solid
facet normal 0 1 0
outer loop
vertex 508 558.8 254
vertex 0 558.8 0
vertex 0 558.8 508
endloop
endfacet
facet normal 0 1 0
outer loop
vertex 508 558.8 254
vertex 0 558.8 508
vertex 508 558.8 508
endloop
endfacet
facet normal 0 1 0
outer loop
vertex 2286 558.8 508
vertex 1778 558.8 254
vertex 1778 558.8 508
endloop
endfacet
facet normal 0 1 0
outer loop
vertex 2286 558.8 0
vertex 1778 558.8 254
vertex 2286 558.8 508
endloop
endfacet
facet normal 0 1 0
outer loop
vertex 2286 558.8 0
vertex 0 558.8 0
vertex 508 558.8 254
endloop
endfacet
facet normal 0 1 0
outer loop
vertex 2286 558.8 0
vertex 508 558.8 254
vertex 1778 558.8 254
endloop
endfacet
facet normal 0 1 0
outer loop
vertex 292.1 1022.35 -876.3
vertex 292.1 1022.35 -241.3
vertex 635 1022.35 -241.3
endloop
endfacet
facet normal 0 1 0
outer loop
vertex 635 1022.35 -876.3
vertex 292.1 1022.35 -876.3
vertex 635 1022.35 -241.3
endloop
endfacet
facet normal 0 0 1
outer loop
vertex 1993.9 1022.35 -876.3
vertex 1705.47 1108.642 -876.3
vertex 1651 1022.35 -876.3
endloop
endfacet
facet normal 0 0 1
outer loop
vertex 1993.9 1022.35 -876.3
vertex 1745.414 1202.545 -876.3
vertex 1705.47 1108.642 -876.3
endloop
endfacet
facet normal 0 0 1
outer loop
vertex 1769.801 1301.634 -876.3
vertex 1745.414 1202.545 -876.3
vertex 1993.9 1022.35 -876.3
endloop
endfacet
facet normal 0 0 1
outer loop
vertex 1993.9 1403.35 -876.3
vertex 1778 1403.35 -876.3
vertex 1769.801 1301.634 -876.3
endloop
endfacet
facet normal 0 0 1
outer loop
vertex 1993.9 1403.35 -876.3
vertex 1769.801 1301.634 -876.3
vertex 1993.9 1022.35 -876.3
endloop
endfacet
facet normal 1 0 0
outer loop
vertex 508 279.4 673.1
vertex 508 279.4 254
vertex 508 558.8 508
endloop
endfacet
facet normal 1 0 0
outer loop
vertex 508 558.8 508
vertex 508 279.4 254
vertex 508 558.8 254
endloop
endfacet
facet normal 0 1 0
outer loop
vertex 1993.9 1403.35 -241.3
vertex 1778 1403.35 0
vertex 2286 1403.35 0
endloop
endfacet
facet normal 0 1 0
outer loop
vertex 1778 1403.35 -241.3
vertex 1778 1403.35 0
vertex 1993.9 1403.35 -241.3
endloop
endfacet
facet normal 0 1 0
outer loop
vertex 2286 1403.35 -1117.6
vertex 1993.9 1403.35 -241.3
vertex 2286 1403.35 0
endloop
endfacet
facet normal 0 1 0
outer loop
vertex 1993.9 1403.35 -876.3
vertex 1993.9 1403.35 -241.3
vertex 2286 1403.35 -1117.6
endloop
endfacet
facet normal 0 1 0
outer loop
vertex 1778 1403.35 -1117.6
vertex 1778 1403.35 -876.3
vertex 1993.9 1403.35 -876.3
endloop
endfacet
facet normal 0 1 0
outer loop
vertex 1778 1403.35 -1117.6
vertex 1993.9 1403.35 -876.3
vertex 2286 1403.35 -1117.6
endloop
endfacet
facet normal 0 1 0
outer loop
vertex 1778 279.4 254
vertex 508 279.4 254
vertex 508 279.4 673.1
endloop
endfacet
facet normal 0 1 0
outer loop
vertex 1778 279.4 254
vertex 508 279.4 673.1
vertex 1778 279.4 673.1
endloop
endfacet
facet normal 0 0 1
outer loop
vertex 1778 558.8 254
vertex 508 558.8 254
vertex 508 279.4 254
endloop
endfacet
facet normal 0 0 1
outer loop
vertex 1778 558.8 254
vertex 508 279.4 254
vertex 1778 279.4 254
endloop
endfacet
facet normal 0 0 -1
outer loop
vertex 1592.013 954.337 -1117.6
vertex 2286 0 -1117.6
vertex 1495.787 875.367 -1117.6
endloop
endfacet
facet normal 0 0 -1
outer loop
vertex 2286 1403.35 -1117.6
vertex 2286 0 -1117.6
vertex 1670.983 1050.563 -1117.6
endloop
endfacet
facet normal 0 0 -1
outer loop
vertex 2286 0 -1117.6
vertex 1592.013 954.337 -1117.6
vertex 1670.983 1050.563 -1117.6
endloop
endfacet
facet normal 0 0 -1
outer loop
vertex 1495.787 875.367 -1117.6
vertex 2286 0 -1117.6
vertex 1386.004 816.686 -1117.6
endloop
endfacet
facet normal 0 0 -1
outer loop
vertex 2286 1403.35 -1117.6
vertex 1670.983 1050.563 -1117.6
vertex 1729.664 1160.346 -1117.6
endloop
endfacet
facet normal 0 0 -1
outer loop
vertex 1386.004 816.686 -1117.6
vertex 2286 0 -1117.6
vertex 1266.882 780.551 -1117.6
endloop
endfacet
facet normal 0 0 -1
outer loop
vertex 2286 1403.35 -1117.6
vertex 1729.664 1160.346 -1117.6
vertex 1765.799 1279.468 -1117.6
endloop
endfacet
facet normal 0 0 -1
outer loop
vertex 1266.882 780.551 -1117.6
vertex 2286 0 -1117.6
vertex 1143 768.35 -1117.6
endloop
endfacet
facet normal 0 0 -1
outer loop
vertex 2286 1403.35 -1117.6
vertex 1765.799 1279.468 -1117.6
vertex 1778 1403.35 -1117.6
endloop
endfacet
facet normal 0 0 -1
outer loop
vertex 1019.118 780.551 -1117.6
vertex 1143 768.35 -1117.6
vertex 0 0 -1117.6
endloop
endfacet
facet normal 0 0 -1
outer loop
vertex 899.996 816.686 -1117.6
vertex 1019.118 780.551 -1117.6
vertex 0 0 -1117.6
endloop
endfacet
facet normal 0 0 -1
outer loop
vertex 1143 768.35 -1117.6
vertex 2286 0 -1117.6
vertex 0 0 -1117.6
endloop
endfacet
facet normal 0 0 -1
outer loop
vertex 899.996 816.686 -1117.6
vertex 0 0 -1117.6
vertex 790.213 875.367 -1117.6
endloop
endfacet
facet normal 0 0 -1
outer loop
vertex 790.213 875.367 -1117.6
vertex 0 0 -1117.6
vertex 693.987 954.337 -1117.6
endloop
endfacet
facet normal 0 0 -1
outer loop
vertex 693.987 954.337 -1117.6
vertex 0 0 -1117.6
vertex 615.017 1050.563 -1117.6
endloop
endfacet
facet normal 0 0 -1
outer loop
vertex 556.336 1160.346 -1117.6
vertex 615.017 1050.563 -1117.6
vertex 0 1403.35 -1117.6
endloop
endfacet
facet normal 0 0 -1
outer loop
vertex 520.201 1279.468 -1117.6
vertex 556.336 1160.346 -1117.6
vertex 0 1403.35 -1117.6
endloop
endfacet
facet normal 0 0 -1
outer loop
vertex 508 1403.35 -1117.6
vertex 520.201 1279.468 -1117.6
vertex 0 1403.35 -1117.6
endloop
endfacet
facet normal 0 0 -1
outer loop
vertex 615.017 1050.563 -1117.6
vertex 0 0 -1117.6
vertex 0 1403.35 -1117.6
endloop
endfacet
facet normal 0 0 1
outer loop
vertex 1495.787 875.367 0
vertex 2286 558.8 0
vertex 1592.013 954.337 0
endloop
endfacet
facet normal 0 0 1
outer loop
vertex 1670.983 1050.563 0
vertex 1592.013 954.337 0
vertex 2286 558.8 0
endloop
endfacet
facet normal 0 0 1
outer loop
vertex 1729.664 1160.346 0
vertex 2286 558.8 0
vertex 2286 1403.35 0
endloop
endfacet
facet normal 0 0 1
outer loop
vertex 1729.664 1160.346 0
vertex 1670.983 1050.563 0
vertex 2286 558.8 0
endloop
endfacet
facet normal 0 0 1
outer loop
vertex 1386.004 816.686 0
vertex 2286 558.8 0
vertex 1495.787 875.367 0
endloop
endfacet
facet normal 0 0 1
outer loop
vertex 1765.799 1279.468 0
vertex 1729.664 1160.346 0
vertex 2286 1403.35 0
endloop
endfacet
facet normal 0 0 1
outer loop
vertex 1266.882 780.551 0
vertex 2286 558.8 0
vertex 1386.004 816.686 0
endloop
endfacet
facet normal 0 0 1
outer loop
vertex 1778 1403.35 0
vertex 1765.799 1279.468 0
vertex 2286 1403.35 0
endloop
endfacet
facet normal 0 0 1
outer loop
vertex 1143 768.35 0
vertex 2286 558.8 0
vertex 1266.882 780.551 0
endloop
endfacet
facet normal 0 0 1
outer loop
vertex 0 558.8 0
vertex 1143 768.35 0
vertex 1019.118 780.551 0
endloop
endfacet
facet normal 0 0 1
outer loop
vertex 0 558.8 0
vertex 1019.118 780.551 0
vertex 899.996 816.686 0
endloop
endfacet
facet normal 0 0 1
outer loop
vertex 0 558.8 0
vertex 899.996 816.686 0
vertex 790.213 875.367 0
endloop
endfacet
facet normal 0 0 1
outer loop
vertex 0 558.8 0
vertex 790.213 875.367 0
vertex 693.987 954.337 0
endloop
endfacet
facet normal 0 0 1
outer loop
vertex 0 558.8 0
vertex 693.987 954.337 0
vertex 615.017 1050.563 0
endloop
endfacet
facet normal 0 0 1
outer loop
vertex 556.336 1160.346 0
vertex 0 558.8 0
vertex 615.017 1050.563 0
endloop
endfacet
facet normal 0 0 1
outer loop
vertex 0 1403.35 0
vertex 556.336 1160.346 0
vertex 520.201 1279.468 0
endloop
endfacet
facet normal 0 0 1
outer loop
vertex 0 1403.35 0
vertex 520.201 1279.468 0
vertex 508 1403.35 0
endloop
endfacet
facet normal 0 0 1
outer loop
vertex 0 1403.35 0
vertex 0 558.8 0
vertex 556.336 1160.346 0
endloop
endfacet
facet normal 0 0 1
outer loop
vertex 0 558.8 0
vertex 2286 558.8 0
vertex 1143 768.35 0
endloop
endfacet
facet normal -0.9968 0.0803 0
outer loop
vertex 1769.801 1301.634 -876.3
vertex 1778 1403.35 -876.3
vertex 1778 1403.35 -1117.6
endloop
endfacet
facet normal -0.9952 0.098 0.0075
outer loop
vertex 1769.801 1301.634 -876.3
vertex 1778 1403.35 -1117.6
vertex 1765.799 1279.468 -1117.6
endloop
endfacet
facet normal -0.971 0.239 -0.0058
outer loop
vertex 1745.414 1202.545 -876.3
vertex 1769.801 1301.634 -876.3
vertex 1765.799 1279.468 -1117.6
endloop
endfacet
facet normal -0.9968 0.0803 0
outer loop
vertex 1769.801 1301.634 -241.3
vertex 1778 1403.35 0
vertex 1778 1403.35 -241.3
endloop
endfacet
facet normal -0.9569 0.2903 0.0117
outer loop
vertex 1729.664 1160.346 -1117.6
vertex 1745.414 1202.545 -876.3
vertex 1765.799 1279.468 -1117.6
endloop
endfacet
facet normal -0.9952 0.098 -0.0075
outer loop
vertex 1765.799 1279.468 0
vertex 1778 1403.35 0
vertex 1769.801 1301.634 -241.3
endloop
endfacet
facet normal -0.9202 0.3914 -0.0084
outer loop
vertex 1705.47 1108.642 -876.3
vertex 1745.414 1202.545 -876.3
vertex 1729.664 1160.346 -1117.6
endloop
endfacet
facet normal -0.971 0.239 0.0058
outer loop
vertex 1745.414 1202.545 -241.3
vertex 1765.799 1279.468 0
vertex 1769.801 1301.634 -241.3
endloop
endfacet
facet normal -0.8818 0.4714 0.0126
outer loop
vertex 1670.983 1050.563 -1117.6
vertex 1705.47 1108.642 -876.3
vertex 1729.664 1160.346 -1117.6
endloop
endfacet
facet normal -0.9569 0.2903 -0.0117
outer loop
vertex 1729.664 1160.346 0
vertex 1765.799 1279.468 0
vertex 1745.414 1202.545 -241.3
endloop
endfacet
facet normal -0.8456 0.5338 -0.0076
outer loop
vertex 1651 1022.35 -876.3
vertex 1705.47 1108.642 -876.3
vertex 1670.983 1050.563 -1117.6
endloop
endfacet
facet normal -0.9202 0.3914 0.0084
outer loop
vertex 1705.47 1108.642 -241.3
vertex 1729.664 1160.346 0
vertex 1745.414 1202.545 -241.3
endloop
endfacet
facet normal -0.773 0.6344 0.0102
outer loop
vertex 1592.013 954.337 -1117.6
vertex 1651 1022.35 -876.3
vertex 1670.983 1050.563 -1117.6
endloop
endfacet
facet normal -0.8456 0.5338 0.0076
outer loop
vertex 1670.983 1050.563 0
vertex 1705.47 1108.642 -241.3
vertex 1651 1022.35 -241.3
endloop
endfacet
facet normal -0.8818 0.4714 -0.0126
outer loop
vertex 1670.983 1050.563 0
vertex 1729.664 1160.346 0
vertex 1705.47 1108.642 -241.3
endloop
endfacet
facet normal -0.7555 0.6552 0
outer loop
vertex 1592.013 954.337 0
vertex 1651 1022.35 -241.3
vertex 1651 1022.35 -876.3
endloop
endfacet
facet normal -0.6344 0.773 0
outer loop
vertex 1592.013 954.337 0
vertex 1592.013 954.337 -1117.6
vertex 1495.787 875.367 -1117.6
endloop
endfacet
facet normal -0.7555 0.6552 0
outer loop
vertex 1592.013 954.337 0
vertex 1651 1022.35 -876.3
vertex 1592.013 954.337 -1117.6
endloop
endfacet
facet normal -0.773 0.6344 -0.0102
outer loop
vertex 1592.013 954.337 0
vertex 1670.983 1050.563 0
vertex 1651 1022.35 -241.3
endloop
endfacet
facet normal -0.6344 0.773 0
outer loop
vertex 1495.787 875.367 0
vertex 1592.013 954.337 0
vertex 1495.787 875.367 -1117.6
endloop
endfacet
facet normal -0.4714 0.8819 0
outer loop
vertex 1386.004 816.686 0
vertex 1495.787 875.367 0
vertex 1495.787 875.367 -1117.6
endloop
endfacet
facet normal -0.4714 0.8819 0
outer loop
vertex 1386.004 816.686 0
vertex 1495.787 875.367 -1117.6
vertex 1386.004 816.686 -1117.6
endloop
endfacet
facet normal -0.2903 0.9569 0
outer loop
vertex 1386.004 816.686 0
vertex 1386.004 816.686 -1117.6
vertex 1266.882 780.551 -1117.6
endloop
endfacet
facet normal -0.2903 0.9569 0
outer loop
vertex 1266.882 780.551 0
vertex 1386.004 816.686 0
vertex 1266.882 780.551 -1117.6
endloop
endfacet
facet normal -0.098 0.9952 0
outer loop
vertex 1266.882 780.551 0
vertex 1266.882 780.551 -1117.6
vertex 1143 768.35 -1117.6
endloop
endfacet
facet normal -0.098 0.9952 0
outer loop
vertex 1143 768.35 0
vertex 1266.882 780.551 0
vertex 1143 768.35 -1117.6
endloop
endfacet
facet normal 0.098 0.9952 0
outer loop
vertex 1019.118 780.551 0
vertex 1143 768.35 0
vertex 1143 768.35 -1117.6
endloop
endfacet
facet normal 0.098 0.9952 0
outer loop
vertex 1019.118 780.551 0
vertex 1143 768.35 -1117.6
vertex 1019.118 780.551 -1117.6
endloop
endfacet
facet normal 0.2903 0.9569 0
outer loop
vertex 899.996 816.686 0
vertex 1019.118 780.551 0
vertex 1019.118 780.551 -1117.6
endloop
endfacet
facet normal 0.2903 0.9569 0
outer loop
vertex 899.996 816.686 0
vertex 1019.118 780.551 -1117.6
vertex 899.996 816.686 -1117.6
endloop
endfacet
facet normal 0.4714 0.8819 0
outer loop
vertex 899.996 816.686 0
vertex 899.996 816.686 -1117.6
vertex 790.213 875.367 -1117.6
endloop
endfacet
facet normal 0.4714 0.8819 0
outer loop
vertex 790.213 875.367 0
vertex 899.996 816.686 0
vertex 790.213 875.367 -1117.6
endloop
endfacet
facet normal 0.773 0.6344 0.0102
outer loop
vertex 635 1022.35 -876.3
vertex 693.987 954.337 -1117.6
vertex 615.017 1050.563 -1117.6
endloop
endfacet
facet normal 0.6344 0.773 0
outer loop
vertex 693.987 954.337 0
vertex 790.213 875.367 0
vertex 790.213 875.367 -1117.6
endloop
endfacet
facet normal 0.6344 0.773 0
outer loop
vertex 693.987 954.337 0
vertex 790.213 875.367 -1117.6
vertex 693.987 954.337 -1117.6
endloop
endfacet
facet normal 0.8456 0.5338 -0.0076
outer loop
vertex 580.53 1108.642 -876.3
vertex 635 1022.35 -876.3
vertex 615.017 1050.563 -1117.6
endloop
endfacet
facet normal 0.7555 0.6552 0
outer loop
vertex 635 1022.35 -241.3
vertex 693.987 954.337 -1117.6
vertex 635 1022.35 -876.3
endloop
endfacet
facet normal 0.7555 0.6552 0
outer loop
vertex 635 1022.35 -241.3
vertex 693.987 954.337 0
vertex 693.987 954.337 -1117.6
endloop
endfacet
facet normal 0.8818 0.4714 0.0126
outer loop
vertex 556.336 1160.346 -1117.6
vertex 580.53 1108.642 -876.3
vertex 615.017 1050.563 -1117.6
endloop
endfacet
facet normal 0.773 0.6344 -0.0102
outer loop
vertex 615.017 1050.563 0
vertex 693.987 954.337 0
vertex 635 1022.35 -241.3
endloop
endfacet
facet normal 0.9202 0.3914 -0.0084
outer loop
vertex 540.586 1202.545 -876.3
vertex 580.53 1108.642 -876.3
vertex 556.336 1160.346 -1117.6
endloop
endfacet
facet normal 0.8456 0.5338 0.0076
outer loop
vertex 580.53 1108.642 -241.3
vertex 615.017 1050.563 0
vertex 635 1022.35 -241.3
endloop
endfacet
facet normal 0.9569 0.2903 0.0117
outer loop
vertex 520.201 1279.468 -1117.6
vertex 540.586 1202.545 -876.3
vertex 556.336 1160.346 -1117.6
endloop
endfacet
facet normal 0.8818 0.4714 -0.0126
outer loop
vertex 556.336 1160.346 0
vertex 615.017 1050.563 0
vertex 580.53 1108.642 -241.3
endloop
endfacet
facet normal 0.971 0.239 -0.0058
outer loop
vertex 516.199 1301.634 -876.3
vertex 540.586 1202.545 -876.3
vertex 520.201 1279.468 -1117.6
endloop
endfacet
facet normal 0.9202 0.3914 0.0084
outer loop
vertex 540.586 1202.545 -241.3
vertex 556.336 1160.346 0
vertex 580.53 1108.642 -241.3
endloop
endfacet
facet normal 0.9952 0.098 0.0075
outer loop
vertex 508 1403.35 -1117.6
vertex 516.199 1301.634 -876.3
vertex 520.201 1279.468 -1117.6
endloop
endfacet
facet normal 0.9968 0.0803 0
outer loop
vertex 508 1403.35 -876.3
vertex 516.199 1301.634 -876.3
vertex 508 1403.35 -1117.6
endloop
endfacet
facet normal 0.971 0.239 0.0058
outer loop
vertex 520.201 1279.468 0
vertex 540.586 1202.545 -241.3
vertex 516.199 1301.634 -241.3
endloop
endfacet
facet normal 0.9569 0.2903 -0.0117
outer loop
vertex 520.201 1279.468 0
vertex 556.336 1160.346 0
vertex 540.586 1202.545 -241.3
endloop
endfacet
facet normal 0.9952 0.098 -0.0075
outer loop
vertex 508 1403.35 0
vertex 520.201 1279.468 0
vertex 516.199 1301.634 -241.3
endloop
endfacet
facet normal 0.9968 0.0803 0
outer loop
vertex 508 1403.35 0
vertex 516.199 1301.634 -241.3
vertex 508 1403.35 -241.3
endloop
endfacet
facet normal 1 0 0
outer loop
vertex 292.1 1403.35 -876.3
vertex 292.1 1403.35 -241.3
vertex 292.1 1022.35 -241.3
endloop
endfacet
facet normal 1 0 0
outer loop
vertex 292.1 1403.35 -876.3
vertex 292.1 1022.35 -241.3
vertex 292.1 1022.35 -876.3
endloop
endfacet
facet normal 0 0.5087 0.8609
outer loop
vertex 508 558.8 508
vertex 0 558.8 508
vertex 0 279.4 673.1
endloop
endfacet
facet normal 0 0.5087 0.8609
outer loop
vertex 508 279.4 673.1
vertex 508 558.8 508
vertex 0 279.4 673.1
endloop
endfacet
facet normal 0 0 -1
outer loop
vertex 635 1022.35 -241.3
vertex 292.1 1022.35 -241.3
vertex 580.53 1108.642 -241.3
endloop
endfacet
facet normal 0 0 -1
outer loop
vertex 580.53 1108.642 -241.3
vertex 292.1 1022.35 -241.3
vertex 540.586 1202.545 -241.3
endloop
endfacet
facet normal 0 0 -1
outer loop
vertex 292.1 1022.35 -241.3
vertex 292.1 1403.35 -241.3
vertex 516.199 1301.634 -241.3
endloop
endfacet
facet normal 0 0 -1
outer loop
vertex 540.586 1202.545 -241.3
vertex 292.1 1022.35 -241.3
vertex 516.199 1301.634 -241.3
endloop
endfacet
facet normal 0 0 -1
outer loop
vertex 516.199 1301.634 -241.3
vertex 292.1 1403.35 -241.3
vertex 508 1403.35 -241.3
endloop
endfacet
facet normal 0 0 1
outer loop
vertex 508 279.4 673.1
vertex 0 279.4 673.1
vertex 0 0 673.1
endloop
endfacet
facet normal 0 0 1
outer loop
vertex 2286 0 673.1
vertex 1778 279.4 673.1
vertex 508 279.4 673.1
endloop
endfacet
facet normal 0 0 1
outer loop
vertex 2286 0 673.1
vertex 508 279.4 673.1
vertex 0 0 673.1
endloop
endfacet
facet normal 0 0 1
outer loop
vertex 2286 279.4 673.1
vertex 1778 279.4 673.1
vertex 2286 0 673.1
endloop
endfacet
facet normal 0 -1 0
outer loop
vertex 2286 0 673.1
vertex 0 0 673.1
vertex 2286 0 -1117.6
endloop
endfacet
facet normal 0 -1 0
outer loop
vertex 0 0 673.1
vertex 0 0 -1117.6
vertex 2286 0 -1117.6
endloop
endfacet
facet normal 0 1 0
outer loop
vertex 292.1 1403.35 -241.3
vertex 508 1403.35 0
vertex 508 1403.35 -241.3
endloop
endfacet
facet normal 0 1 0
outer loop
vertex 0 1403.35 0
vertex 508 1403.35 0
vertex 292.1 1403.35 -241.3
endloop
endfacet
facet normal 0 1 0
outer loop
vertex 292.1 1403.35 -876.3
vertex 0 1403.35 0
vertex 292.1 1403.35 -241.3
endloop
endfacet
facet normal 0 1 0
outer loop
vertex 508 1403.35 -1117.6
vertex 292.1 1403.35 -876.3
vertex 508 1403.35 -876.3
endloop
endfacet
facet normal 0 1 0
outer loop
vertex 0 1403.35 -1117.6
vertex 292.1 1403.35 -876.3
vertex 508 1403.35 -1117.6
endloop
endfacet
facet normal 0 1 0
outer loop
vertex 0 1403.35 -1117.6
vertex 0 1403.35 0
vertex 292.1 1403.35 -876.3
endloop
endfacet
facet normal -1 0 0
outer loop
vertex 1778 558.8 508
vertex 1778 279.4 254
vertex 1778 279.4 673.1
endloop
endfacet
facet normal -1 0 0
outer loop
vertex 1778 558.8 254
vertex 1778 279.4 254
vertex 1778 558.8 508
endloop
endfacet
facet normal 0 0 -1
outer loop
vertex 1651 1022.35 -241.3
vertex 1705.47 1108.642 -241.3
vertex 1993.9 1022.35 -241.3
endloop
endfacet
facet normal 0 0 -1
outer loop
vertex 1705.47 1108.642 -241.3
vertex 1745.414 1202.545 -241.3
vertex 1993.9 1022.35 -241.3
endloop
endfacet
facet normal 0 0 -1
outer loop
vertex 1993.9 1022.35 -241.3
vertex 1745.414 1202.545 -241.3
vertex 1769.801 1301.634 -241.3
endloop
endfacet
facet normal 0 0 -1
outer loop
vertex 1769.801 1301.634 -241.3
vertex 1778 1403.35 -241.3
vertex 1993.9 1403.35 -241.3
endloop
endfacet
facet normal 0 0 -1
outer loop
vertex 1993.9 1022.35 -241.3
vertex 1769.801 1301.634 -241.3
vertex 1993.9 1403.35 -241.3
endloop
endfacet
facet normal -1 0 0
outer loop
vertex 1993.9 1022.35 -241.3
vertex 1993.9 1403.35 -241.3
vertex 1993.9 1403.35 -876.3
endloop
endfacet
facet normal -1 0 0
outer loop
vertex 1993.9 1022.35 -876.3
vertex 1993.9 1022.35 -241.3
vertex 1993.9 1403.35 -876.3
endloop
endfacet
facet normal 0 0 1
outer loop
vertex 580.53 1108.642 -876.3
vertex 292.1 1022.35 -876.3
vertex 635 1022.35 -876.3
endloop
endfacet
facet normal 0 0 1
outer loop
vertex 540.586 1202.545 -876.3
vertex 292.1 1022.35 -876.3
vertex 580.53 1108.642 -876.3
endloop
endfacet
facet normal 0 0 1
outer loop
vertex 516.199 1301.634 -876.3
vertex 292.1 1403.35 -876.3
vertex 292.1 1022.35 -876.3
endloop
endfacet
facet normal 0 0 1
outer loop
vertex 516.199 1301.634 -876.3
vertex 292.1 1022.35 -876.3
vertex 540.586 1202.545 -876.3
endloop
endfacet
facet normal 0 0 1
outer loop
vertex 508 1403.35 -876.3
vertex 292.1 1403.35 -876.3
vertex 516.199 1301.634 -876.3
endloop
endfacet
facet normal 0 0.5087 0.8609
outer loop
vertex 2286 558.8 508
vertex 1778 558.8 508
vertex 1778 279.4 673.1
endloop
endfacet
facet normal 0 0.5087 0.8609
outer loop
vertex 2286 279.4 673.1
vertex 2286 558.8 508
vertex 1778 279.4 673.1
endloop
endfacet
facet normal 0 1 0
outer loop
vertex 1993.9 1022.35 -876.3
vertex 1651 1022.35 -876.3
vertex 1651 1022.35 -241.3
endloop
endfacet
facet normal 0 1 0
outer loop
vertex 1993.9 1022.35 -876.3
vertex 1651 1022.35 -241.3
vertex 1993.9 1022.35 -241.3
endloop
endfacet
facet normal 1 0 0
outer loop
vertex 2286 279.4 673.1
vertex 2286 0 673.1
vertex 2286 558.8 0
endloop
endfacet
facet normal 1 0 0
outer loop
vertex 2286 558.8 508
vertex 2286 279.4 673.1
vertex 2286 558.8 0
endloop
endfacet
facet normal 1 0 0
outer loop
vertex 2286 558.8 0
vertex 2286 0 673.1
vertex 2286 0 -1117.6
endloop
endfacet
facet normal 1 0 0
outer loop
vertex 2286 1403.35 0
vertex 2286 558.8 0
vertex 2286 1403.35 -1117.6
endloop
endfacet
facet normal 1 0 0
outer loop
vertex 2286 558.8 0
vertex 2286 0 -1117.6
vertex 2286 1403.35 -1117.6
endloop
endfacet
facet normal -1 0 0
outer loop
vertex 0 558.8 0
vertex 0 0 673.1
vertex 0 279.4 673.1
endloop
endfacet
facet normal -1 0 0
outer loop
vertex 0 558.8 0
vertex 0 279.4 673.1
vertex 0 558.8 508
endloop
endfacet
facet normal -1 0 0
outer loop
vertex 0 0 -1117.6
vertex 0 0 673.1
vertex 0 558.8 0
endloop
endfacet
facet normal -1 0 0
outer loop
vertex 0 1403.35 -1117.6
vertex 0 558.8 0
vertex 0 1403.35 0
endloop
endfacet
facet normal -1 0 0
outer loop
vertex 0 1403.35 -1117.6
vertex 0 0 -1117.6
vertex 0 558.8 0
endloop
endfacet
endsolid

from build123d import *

# Parameters (mm, degrees)
SKETCH1_W           = 1117.6
SKETCH1_H           = 1403.35
BOSS_EXTRUDE1_DEPTH = 2286
SKETCH2_W           = 2286
SKETCH2_H           = 558.8
BOSS_EXTRUDE2_DEPTH = 673.1
CUT_EXTRUDE1_DEPTH  = 2286
SKETCH7_W           = 1270
SKETCH7_H           = 279.4
CUT_EXTRUDE2_DEPTH  = 673.1
SKETCH8_W           = 1270
SKETCH8_H           = 279.4
BOSS_EXTRUDE3_DEPTH = 254
CUT_EXTRUDE3_DEPTH  = 1117.6
SKETCH10_W          = 381
SKETCH10_H          = 635
CUT_EXTRUDE4_DEPTH  = 381


with BuildPart() as part:
    # Sketch1 → Boss-Extrude1 (new body)
    with BuildSketch(Plane(origin=(0, 0, 0), x_dir=(0, 0, -1), z_dir=(1, 0, 0))):
        with Locations((558.8, 701.675)):
            Rectangle(SKETCH1_W, SKETCH1_H)
    extrude(amount=BOSS_EXTRUDE1_DEPTH)

    # Sketch2 → Boss-Extrude2 (add)
    with BuildSketch(Plane.XY):
        with Locations((1143, 279.4)):
            Rectangle(SKETCH2_W, SKETCH2_H)
    extrude(amount=BOSS_EXTRUDE2_DEPTH)

    # Sketch3 → Cut-Extrude1 (cut)
    with BuildSketch(Plane.ZY):
        Polygon((508, 558.8), (673.1, 279.4), (673.1, 558.8), align=None)
    extrude(amount=-CUT_EXTRUDE1_DEPTH, mode=Mode.SUBTRACT)

    # Sketch7 → Cut-Extrude2 (cut)
    with BuildSketch(Plane.XY):
        with Locations((1143, 419.1)):
            Rectangle(SKETCH7_W, SKETCH7_H)
    extrude(amount=CUT_EXTRUDE2_DEPTH, mode=Mode.SUBTRACT)

    # Sketch8 → Boss-Extrude3 (add)
    with BuildSketch(Plane.XY):
        with Locations((1143, 419.1)):
            Rectangle(SKETCH8_W, SKETCH8_H)
    extrude(amount=BOSS_EXTRUDE3_DEPTH)

    # Sketch9 → Cut-Extrude3 (cut)
    with BuildSketch(Plane.XY):
        with BuildLine():
            Line((508, 1403.35), (1778, 1403.35))
            ThreePointArc((1778, 1403.35), (1143, 768.35), (508, 1403.35))
        make_face()
    extrude(amount=-CUT_EXTRUDE3_DEPTH, mode=Mode.SUBTRACT)

    # Sketch10 → Cut-Extrude4 (cut)
    with BuildSketch(Plane(origin=(0, 1403.35, 0), x_dir=(1, 0, 0), z_dir=(0, 1, 0))):
        with Locations((482.6, 558.8)):
            Rectangle(SKETCH10_W, SKETCH10_H)
        with Locations((1803.4, 558.8)):
            Rectangle(SKETCH10_W, SKETCH10_H)
    extrude(amount=-CUT_EXTRUDE4_DEPTH, mode=Mode.SUBTRACT)


solid = part.part
